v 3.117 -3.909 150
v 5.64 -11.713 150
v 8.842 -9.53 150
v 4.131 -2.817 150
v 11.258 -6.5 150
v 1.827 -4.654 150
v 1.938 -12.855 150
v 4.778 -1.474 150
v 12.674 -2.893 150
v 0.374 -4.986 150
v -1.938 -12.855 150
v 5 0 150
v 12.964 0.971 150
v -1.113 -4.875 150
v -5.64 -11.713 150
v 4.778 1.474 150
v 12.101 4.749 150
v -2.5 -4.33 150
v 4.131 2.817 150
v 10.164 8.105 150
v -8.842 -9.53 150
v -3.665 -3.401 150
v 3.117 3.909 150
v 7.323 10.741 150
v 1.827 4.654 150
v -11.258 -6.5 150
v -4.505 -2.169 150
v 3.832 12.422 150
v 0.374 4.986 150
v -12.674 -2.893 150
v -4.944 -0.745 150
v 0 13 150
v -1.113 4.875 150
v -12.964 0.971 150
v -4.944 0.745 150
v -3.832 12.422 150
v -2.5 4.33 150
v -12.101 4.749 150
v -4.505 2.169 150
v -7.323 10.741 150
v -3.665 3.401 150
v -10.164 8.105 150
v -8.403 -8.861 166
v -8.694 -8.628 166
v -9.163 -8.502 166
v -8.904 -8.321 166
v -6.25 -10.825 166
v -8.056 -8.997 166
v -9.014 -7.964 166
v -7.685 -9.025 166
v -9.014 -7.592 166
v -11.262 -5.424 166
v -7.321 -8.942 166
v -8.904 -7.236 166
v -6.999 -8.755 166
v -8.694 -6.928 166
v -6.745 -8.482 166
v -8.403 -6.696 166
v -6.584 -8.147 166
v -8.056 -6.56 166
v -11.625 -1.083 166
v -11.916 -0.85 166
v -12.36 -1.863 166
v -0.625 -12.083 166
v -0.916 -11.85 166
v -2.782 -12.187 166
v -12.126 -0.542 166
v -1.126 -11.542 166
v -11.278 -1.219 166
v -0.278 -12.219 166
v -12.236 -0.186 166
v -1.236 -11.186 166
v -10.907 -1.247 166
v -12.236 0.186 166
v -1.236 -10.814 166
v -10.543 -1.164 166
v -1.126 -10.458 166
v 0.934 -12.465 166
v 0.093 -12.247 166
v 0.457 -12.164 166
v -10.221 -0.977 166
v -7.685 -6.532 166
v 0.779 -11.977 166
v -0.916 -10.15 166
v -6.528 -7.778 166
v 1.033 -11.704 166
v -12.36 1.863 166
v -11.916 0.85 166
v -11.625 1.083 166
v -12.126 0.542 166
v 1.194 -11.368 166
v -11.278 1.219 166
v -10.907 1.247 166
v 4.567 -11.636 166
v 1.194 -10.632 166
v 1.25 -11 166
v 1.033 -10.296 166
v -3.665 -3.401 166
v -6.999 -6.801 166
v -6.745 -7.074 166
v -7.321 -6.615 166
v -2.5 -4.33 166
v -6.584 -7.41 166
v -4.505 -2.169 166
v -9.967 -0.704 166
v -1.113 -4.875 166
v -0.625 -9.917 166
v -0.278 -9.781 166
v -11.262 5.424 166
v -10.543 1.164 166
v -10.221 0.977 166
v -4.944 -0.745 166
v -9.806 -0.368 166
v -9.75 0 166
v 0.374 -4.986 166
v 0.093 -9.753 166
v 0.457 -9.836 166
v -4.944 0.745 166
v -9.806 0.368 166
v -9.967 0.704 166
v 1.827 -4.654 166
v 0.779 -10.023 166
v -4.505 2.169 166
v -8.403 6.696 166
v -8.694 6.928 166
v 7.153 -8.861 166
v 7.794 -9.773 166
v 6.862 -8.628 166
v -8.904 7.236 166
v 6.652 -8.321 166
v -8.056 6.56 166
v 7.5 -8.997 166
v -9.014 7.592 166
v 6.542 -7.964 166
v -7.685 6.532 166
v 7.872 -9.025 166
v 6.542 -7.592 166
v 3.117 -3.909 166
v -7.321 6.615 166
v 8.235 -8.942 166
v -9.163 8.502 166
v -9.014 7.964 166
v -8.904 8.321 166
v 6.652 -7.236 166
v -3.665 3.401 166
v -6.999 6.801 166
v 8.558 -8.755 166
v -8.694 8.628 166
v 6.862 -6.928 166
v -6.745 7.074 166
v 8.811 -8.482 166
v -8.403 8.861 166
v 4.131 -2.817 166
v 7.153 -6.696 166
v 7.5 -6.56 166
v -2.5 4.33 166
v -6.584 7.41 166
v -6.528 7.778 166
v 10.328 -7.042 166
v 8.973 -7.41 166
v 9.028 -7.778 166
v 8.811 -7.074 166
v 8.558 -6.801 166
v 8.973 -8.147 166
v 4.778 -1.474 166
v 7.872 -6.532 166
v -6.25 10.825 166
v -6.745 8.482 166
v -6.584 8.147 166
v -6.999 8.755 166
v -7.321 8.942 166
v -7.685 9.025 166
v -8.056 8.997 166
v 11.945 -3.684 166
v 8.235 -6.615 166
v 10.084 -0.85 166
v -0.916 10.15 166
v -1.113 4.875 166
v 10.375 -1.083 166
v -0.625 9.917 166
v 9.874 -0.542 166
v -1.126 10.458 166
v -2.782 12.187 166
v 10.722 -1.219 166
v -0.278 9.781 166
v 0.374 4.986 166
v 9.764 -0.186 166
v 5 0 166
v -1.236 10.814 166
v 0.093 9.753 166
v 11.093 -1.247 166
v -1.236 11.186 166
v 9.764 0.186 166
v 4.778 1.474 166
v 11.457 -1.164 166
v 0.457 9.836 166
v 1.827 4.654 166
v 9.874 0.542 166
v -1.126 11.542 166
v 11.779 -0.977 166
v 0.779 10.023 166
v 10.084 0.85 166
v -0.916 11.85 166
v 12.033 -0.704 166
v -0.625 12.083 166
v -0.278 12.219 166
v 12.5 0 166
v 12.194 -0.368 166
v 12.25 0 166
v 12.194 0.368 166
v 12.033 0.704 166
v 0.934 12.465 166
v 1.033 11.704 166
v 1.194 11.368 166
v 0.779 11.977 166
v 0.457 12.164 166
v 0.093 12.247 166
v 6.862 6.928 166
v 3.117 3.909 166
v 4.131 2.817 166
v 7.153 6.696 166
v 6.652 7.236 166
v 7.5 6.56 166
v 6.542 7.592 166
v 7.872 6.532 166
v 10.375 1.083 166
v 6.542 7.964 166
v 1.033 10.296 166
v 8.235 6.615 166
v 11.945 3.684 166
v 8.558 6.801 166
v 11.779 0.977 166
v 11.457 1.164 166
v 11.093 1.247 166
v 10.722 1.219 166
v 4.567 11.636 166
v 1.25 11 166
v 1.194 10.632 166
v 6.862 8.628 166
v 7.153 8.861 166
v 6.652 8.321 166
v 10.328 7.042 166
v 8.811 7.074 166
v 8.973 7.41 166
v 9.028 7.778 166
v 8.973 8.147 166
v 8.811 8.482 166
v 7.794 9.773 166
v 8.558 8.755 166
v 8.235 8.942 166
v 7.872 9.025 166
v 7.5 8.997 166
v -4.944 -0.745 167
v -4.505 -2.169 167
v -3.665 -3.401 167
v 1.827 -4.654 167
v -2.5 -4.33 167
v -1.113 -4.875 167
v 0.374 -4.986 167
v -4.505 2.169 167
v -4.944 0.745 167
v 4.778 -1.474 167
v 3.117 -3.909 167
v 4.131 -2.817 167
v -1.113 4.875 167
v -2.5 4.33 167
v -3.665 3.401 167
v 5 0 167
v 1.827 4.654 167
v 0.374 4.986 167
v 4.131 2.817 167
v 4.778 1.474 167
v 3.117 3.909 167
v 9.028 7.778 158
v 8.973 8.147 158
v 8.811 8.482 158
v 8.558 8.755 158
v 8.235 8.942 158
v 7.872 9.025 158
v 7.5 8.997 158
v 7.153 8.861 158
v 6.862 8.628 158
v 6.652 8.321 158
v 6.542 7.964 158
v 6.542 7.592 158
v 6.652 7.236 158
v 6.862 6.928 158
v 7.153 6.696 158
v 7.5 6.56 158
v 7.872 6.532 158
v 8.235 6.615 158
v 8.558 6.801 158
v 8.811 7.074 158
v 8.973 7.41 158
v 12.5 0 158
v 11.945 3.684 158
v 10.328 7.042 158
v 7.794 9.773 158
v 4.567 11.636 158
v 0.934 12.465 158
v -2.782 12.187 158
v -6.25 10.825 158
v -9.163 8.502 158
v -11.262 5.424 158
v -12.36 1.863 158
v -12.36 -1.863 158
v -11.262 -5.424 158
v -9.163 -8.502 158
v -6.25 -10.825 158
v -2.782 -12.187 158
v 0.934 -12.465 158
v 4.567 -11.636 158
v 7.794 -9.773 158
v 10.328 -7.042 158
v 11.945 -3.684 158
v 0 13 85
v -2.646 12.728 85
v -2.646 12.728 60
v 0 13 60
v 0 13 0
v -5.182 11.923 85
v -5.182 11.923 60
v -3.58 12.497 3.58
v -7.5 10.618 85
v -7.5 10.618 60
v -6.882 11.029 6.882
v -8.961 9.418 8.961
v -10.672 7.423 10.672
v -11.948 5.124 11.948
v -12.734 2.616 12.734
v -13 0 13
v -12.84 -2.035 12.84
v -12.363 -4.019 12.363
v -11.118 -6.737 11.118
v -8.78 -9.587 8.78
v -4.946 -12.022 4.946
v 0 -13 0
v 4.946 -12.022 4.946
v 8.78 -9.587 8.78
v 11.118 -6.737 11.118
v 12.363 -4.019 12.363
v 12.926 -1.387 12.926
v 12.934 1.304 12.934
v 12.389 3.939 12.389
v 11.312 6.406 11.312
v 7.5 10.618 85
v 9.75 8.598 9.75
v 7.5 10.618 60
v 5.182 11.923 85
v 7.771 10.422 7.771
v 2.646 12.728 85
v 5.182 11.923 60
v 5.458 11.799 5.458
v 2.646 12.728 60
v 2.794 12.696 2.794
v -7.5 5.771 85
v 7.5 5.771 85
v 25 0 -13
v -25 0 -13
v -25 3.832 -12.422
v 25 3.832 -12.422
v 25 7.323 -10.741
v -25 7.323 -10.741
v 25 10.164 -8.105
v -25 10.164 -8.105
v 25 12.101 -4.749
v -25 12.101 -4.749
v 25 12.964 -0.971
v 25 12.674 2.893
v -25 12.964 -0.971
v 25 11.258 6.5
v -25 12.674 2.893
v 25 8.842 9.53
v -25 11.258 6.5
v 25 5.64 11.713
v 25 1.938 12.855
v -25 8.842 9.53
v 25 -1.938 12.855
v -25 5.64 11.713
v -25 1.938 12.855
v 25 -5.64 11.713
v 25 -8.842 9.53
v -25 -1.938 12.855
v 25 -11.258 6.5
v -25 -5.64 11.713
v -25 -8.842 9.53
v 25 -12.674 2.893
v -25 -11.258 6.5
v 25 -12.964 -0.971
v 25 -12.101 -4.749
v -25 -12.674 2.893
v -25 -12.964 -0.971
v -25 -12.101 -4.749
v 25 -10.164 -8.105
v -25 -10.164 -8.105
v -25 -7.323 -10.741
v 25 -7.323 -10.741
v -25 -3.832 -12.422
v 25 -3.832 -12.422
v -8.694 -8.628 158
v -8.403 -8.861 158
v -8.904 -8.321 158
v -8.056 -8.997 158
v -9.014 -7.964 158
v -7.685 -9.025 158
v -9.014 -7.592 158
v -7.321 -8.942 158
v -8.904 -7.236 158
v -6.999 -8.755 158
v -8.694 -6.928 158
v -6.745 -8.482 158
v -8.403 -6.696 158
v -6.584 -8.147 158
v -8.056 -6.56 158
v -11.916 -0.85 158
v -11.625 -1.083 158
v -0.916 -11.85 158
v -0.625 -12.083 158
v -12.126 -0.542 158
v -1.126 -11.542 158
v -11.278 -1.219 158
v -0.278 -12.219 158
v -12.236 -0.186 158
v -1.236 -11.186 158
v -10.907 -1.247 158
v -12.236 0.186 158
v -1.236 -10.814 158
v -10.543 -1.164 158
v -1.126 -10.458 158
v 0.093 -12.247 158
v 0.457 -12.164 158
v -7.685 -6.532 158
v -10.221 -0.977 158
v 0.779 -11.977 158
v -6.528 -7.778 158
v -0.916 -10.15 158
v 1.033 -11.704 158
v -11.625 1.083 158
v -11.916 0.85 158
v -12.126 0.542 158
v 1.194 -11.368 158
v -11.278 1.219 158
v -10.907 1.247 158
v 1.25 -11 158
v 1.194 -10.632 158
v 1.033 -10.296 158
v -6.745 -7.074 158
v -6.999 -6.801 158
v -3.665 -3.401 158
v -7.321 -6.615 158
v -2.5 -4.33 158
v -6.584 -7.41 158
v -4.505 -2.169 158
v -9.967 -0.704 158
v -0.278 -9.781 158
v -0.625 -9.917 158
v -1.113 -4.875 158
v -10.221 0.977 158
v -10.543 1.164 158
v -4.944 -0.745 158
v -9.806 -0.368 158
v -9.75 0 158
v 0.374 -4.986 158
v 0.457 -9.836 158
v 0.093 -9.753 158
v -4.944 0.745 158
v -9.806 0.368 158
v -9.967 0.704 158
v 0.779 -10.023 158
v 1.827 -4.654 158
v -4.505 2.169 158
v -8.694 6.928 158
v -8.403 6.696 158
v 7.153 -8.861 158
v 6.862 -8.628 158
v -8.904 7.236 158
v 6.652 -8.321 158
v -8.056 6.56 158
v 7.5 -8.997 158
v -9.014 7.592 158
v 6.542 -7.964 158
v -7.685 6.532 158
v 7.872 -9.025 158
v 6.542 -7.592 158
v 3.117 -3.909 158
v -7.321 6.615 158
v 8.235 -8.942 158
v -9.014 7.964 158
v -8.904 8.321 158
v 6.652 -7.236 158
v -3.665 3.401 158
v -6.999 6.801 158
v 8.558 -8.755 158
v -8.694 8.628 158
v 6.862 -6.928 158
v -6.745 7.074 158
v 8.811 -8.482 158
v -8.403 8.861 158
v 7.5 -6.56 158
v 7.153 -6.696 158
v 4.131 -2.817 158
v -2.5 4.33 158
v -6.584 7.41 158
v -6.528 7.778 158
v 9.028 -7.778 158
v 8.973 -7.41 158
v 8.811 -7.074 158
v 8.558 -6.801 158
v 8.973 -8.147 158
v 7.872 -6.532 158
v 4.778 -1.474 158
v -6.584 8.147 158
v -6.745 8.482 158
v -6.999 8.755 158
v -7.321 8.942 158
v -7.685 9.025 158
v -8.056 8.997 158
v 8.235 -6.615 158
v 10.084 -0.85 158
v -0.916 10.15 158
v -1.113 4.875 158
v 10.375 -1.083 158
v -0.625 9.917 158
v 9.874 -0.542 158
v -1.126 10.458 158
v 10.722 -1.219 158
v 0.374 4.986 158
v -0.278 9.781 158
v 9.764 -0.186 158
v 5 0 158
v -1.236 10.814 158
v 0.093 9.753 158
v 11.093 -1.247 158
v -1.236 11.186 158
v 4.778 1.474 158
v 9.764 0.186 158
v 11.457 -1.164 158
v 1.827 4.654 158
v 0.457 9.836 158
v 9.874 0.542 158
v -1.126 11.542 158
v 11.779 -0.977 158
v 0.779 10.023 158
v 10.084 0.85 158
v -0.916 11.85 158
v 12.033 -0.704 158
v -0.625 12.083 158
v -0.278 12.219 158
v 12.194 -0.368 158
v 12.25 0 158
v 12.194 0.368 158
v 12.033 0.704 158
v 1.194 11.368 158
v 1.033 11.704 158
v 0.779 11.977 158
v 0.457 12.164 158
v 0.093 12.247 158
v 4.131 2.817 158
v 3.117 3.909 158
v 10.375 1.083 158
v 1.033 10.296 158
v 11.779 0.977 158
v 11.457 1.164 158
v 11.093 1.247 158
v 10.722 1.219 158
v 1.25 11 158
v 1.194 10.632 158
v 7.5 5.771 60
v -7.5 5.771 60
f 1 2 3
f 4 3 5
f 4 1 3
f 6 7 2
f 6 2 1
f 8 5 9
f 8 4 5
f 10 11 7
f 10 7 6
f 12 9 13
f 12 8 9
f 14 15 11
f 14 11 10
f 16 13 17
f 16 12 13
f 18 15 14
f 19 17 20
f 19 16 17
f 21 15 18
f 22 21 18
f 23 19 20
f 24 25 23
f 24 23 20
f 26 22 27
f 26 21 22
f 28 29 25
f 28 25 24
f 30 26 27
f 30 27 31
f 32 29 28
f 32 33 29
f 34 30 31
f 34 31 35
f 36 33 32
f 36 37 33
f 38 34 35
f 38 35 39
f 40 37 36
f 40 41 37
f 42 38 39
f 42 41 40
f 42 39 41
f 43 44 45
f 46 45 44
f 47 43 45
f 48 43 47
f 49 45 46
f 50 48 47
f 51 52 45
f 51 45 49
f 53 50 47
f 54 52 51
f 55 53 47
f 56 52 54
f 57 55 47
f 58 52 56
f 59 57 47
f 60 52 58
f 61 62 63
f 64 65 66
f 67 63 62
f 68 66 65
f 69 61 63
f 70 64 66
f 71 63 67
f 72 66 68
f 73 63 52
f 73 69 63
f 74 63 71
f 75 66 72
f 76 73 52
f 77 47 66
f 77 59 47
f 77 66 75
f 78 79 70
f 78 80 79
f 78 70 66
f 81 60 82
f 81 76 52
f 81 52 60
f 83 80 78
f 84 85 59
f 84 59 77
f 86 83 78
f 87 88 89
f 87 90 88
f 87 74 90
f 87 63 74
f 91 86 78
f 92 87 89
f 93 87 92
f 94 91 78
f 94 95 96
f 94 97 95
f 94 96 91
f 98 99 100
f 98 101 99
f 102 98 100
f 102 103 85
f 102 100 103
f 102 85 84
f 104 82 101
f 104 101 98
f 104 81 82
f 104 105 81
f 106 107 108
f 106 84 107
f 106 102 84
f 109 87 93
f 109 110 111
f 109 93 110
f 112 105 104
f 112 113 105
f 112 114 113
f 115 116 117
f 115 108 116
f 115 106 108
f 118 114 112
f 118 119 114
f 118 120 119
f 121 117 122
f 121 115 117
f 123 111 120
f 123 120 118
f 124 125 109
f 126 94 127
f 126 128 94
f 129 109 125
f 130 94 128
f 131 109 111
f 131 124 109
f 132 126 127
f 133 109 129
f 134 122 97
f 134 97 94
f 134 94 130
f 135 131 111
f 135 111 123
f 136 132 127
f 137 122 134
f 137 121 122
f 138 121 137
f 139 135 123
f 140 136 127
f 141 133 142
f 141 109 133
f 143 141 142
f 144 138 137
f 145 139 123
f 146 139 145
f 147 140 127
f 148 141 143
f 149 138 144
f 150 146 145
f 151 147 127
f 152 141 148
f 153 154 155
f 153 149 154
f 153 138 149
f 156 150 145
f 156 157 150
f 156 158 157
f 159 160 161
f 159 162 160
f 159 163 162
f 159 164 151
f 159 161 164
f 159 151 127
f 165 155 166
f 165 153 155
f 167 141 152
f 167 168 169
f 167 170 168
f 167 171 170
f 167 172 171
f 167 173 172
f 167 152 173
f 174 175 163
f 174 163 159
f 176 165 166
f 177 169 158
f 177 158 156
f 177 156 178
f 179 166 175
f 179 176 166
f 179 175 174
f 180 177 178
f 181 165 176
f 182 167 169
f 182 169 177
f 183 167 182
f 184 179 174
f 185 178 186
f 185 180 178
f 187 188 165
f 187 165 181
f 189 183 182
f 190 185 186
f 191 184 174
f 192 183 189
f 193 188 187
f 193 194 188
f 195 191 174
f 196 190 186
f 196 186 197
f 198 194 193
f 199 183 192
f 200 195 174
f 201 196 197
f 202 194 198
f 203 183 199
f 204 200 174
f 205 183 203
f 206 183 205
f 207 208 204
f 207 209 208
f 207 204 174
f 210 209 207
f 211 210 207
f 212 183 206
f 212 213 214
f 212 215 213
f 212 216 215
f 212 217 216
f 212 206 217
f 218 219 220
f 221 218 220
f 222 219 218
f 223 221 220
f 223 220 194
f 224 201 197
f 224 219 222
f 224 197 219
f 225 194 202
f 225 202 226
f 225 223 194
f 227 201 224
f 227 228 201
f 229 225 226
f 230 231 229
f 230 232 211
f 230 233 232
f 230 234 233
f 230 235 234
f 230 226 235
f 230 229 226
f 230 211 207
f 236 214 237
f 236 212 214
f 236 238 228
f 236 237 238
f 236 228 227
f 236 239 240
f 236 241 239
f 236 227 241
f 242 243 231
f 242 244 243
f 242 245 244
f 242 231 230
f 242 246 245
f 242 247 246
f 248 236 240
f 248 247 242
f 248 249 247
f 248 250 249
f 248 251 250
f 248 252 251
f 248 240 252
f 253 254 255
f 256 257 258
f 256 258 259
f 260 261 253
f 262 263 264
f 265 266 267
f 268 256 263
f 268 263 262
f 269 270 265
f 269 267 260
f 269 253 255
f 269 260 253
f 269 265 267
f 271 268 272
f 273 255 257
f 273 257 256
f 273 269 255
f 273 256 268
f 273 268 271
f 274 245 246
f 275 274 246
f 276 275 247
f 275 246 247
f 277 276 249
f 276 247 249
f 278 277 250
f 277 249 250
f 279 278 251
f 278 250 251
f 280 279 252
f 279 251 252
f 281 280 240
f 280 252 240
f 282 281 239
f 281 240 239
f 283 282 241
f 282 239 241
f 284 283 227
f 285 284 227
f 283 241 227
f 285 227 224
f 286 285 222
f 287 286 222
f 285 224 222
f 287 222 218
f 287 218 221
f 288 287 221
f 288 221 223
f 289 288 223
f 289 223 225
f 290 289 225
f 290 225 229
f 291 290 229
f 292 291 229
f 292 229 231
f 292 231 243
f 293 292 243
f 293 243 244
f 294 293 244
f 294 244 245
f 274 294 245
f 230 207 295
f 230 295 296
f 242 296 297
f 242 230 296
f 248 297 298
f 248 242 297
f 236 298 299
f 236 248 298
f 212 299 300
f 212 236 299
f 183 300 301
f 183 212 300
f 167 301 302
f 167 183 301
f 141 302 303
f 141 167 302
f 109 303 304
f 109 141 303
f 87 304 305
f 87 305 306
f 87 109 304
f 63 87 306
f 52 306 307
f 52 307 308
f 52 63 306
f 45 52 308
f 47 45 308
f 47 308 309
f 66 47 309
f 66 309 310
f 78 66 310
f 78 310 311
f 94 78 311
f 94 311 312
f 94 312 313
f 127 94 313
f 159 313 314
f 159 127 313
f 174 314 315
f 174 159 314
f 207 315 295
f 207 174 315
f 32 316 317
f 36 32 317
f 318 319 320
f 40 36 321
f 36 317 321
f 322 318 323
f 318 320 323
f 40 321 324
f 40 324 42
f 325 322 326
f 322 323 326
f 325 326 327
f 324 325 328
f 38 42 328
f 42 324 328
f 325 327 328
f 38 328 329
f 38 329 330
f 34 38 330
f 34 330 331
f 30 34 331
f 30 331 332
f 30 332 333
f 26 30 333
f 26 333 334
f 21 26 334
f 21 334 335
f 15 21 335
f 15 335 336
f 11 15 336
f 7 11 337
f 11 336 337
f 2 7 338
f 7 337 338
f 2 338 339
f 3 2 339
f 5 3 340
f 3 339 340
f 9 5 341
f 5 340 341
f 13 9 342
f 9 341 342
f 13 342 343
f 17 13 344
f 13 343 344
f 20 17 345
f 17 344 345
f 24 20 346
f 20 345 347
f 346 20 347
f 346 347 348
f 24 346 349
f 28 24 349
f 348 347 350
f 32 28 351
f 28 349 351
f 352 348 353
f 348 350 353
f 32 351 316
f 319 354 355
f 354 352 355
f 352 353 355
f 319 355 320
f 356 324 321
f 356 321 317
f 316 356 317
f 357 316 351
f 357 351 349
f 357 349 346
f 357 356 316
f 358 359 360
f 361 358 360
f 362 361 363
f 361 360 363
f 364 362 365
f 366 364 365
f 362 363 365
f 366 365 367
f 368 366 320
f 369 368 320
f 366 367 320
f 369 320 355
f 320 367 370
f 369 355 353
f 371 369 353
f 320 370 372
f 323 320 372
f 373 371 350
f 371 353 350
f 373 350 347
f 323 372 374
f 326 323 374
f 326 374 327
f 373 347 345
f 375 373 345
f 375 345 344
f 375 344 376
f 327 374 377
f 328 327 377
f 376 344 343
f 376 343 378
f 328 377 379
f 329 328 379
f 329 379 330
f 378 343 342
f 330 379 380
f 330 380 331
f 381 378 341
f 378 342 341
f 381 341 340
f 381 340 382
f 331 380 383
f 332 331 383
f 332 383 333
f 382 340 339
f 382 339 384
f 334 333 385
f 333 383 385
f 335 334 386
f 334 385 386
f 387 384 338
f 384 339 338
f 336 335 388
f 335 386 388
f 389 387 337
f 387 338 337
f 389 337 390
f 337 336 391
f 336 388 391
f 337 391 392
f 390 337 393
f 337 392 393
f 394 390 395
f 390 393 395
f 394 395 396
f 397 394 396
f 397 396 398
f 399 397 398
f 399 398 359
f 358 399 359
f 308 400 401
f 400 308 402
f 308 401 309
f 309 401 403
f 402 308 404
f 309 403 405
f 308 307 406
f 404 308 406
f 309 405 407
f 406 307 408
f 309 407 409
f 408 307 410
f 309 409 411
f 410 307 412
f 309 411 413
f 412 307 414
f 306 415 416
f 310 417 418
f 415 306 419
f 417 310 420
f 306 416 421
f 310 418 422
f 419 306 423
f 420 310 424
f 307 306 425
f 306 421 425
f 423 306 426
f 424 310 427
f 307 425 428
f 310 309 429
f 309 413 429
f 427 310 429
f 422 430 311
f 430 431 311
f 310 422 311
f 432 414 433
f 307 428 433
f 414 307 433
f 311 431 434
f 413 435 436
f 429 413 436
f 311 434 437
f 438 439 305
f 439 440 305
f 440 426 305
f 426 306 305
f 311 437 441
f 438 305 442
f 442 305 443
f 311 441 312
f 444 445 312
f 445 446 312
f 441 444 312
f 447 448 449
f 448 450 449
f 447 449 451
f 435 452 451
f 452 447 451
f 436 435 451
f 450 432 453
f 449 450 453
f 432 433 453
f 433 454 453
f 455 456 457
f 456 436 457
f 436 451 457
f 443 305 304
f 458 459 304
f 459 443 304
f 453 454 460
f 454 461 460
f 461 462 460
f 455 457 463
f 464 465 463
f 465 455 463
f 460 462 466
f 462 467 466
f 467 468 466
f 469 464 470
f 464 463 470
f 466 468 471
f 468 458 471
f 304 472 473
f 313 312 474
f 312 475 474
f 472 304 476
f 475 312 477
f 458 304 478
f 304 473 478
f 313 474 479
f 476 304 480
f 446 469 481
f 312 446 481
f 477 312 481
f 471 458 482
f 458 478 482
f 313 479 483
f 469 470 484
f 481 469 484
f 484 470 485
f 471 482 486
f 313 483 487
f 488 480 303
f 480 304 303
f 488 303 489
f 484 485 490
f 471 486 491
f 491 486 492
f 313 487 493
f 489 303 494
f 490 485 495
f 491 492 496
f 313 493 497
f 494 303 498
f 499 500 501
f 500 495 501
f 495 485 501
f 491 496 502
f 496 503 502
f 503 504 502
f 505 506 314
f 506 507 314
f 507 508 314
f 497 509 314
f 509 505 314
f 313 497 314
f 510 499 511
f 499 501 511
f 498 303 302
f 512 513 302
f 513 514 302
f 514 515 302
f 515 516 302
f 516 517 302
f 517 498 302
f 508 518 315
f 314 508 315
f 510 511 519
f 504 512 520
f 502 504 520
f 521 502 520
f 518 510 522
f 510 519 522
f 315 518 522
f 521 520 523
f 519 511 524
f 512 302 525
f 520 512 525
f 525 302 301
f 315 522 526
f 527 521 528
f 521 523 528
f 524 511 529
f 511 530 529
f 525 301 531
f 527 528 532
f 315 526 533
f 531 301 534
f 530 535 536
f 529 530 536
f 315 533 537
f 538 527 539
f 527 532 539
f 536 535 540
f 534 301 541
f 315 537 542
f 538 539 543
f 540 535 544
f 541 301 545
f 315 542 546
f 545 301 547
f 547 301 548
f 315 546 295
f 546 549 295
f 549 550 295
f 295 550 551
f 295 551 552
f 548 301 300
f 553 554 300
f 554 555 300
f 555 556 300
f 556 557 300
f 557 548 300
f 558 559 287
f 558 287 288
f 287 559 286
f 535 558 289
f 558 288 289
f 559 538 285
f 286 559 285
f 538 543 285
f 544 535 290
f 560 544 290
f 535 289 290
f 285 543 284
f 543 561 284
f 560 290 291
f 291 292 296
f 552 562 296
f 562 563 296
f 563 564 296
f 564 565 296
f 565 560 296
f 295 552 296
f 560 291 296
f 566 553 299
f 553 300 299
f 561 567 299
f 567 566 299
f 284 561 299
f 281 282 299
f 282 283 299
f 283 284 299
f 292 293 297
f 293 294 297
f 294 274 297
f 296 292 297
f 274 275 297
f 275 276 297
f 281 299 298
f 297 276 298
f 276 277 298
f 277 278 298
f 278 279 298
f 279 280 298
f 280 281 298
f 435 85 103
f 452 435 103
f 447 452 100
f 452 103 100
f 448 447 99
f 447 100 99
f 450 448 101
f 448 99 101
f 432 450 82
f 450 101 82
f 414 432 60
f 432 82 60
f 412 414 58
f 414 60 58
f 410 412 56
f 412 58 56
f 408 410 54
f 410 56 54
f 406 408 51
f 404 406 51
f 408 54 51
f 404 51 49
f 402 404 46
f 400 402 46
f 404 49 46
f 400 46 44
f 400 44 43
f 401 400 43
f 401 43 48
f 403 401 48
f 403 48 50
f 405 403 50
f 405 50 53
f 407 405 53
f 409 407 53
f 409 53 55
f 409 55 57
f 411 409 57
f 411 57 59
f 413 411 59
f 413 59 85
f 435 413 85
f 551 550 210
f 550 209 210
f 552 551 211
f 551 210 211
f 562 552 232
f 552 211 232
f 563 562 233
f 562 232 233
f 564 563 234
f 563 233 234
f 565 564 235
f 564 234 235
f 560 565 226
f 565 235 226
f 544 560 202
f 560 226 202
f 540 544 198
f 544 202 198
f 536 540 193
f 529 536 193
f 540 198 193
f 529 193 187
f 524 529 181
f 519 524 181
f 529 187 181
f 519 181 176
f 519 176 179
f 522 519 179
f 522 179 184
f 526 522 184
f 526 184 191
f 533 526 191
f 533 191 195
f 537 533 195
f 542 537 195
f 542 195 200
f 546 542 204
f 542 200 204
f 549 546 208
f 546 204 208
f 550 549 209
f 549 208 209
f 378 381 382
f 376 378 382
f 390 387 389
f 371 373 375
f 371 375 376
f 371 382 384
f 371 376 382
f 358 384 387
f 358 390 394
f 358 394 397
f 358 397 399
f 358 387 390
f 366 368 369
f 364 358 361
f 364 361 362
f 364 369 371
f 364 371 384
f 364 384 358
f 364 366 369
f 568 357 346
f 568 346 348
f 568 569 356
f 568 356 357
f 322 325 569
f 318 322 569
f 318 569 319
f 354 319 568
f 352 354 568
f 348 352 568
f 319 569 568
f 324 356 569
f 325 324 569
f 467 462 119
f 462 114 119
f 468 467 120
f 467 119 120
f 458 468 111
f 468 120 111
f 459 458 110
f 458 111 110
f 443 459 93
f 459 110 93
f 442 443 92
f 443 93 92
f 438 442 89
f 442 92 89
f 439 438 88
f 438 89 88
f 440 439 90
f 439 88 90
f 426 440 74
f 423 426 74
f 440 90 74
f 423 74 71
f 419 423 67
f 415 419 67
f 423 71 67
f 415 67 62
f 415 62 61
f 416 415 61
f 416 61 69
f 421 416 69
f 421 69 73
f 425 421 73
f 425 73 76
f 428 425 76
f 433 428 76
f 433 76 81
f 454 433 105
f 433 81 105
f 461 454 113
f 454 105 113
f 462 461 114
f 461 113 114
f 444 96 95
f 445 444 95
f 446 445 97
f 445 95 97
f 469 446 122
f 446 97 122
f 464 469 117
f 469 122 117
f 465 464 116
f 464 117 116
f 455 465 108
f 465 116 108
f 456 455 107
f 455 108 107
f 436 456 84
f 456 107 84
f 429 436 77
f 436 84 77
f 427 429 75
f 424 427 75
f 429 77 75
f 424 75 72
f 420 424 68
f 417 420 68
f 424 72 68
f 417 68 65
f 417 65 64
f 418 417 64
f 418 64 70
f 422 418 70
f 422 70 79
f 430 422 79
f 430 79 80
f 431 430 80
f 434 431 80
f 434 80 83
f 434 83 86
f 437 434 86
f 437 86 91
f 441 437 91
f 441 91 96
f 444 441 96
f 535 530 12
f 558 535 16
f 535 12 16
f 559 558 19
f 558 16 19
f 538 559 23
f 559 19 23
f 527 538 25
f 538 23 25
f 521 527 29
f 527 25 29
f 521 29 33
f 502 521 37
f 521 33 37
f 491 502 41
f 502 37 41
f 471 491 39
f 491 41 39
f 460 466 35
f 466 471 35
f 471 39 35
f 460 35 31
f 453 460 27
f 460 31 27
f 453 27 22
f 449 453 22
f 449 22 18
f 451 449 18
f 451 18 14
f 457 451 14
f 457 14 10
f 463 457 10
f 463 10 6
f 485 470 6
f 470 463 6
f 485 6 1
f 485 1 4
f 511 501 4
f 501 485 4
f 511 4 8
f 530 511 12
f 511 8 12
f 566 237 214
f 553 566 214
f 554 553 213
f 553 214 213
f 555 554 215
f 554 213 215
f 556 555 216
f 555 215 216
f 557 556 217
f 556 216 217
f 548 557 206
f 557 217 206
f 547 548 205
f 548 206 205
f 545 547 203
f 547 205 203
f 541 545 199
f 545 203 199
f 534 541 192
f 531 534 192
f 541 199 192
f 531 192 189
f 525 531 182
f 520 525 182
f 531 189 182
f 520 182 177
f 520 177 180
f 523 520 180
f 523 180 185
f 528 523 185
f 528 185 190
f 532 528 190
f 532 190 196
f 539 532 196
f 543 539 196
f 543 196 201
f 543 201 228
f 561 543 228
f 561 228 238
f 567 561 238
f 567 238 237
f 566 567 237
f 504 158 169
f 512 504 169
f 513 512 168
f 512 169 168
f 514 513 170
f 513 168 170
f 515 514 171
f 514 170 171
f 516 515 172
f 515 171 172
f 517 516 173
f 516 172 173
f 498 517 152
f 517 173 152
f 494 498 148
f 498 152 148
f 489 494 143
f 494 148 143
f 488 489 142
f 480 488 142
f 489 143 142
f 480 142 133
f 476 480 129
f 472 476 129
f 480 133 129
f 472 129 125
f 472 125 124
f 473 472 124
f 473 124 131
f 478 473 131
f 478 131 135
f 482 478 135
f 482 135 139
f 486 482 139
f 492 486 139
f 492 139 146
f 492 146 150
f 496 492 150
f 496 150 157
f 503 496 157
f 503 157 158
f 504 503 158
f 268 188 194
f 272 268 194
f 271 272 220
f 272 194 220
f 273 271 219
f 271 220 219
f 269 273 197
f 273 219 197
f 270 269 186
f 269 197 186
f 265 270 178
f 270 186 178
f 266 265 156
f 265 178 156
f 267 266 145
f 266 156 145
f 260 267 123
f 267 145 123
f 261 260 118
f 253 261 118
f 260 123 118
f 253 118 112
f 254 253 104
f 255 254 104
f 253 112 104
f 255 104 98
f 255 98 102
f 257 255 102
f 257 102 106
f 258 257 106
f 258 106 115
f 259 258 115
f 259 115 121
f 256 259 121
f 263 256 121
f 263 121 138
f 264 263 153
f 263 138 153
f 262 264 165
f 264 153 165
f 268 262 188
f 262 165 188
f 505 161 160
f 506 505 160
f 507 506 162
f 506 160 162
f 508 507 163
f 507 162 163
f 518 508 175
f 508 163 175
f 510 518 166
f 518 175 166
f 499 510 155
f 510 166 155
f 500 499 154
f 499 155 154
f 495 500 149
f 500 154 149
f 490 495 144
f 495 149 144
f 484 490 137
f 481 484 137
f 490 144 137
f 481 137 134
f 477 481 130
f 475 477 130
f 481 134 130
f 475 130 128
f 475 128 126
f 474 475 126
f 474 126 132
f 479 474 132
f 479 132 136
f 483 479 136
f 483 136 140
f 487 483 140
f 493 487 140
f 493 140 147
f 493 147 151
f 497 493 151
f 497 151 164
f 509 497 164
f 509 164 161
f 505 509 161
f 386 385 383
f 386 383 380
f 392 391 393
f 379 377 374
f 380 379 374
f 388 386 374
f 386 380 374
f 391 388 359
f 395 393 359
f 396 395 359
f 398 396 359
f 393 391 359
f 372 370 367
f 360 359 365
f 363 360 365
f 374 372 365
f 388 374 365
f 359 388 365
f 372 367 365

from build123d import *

# Parameters (mm, degrees)
AUFSATZ_LINEAR_AUSTRAGEN1_DEPTH      = 25
AUFSATZ_LINEAR_AUSTRAGEN1_DEPTH_BACK = 25
SKIZZE1_R                            = 13
SKIZZE2_R                            = 13
AUFSATZ_LINEAR_AUSTRAGEN2_DEPTH      = 150
SKIZZE4_R                            = 5
AUFSATZ_LINEAR_AUSTRAGEN3_DEPTH      = 16
SKIZZE5_R                            = 12.5
AUFSATZ_LINEAR_AUSTRAGEN4_DEPTH      = 8
SKIZZE6_R                            = 5
AUFSATZ_LINEAR_AUSTRAGEN5_DEPTH      = 1
SCHNITT_LINEAR_AUSTRAGEN2_REACH      = 183.204
SKIZZE7_R                            = 1.25
SCHNITT_LINEAR_AUSTRAGEN3_REACH      = 171.901
SCHNITT_LINEAR_AUSTRAGEN3_END_RADIUS = 13
SKIZZE8_W                            = 15
SKIZZE8_H                            = 25


with BuildPart() as part:
    # Skizze1 → Aufsatz-Linear austragen1 (new, two sides: drawn at the far end of the back side and taken through both)
    with BuildSketch(Plane(origin=(0, 0, 0), x_dir=(0, 0, -1), z_dir=(1, 0, 0)).offset(-AUFSATZ_LINEAR_AUSTRAGEN1_DEPTH_BACK)):
        Circle(SKIZZE1_R)
    extrude(amount=AUFSATZ_LINEAR_AUSTRAGEN1_DEPTH + AUFSATZ_LINEAR_AUSTRAGEN1_DEPTH_BACK)

    # Skizze2 → Aufsatz-Linear austragen2 (add)
    with BuildSketch(Plane.XY):
        with Locations(Location((0, 0, 0), (0, 0, 90))):
            Circle(SKIZZE2_R)
    extrude(amount=AUFSATZ_LINEAR_AUSTRAGEN2_DEPTH)

    # Skizze4 → Aufsatz-Linear austragen3 (add)
    with BuildSketch(Plane.XY.offset(150)):
        Circle(SKIZZE4_R)
    extrude(amount=AUFSATZ_LINEAR_AUSTRAGEN3_DEPTH)

    # Skizze5 → Aufsatz-Linear austragen4 (add)
    with BuildSketch(Plane.XY.offset(166)):
        Circle(SKIZZE5_R)
    extrude(amount=-AUFSATZ_LINEAR_AUSTRAGEN4_DEPTH)

    # Skizze6 → Aufsatz-Linear austragen5 (add)
    with BuildSketch(Plane.XY.offset(166)):
        Circle(SKIZZE6_R)
    extrude(amount=AUFSATZ_LINEAR_AUSTRAGEN5_DEPTH)

    # Skizze7 → Schnitt-Linear austragen2 (cut, up to next)
    with BuildSketch(Plane.XY.offset(166), mode=Mode.PRIVATE) as schnitt_linear_austragen2_sk1:
        with Locations((-11, 0)):
            Circle(SKIZZE7_R)
    schnitt_linear_austragen2_tool1 = extrude(schnitt_linear_austragen2_sk1.sketch, amount=-SCHNITT_LINEAR_AUSTRAGEN2_REACH, mode=Mode.PRIVATE) & part.part
    # Skizze7 → Schnitt-Linear austragen2 (cut, up to next)
    with BuildSketch(Plane.XY.offset(166), mode=Mode.PRIVATE) as schnitt_linear_austragen2_sk2:
        with Locations((-7.778174593, 7.778174593)):
            Circle(SKIZZE7_R)
    schnitt_linear_austragen2_tool2 = extrude(schnitt_linear_austragen2_sk2.sketch, amount=-SCHNITT_LINEAR_AUSTRAGEN2_REACH, mode=Mode.PRIVATE) & part.part
    # Skizze7 → Schnitt-Linear austragen2 (cut, up to next)
    with BuildSketch(Plane.XY.offset(166), mode=Mode.PRIVATE) as schnitt_linear_austragen2_sk3:
        with Locations((7.778174593, 7.778174593)):
            Circle(SKIZZE7_R)
    schnitt_linear_austragen2_tool3 = extrude(schnitt_linear_austragen2_sk3.sketch, amount=-SCHNITT_LINEAR_AUSTRAGEN2_REACH, mode=Mode.PRIVATE) & part.part
    # Skizze7 → Schnitt-Linear austragen2 (cut, up to next)
    with BuildSketch(Plane.XY.offset(166), mode=Mode.PRIVATE) as schnitt_linear_austragen2_sk4:
        with Locations((11, 0)):
            Circle(SKIZZE7_R)
    schnitt_linear_austragen2_tool4 = extrude(schnitt_linear_austragen2_sk4.sketch, amount=-SCHNITT_LINEAR_AUSTRAGEN2_REACH, mode=Mode.PRIVATE) & part.part
    # Skizze7 → Schnitt-Linear austragen2 (cut, up to next)
    with BuildSketch(Plane.XY.offset(166), mode=Mode.PRIVATE) as schnitt_linear_austragen2_sk5:
        with Locations((7.778174593, -7.778174593)):
            Circle(SKIZZE7_R)
    schnitt_linear_austragen2_tool5 = extrude(schnitt_linear_austragen2_sk5.sketch, amount=-SCHNITT_LINEAR_AUSTRAGEN2_REACH, mode=Mode.PRIVATE) & part.part
    # Skizze7 → Schnitt-Linear austragen2 (cut, up to next)
    with BuildSketch(Plane.XY.offset(166), mode=Mode.PRIVATE) as schnitt_linear_austragen2_sk6:
        with Locations((-7.778174593, -7.778174593)):
            Circle(SKIZZE7_R)
    schnitt_linear_austragen2_tool6 = extrude(schnitt_linear_austragen2_sk6.sketch, amount=-SCHNITT_LINEAR_AUSTRAGEN2_REACH, mode=Mode.PRIVATE) & part.part
    # Skizze7 → Schnitt-Linear austragen2 (cut, up to next)
    with BuildSketch(Plane.XY.offset(166), mode=Mode.PRIVATE) as schnitt_linear_austragen2_sk7:
        with Locations((0, -11)):
            Circle(SKIZZE7_R)
    schnitt_linear_austragen2_tool7 = extrude(schnitt_linear_austragen2_sk7.sketch, amount=-SCHNITT_LINEAR_AUSTRAGEN2_REACH, mode=Mode.PRIVATE) & part.part
    # Skizze7 → Schnitt-Linear austragen2 (cut, up to next)
    with BuildSketch(Plane.XY.offset(166), mode=Mode.PRIVATE) as schnitt_linear_austragen2_sk8:
        with Locations((0, 11)):
            Circle(SKIZZE7_R)
    schnitt_linear_austragen2_tool8 = extrude(schnitt_linear_austragen2_sk8.sketch, amount=-SCHNITT_LINEAR_AUSTRAGEN2_REACH, mode=Mode.PRIVATE) & part.part
    add(schnitt_linear_austragen2_tool1.solids().sort_by_distance((-11, 0, 166))[0], mode=Mode.SUBTRACT)
    add(schnitt_linear_austragen2_tool2.solids().sort_by_distance((-7.778175, 7.778175, 166))[0], mode=Mode.SUBTRACT)
    add(schnitt_linear_austragen2_tool3.solids().sort_by_distance((7.778175, 7.778175, 166))[0], mode=Mode.SUBTRACT)
    add(schnitt_linear_austragen2_tool4.solids().sort_by_distance((11, 0, 166))[0], mode=Mode.SUBTRACT)
    add(schnitt_linear_austragen2_tool5.solids().sort_by_distance((7.778175, -7.778175, 166))[0], mode=Mode.SUBTRACT)
    add(schnitt_linear_austragen2_tool6.solids().sort_by_distance((-7.778175, -7.778175, 166))[0], mode=Mode.SUBTRACT)
    add(schnitt_linear_austragen2_tool7.solids().sort_by_distance((0, -11, 166))[0], mode=Mode.SUBTRACT)
    add(schnitt_linear_austragen2_tool8.solids().sort_by_distance((0, 11, 166))[0], mode=Mode.SUBTRACT)

    # Schnitt-Linear austragen3: up to this cylinder (the profile starts inside it)
    schnitt_linear_austragen3_end = Plane(origin=(0, 0, 72.5), z_dir=(0, 0, -1)) * Cylinder(SCHNITT_LINEAR_AUSTRAGEN3_END_RADIUS, 370.802, mode=Mode.PRIVATE)
    # Skizze8 → Schnitt-Linear austragen3 (cut, up to the surface)
    with BuildSketch(Plane(origin=(0, 5.771219274, 0), x_dir=(1, 0, 0), z_dir=(0, 1, 0)), mode=Mode.PRIVATE) as schnitt_linear_austragen3_sk1:
        with Locations((0, -72.5)):
            Rectangle(SKIZZE8_W, SKIZZE8_H)
    schnitt_linear_austragen3_tool1 = extrude(schnitt_linear_austragen3_sk1.sketch, amount=SCHNITT_LINEAR_AUSTRAGEN3_REACH, mode=Mode.PRIVATE) & schnitt_linear_austragen3_end
    add(schnitt_linear_austragen3_tool1.solids().sort_by_distance((0, 5.771219, 72.5))[0], mode=Mode.SUBTRACT)


solid = part.part
